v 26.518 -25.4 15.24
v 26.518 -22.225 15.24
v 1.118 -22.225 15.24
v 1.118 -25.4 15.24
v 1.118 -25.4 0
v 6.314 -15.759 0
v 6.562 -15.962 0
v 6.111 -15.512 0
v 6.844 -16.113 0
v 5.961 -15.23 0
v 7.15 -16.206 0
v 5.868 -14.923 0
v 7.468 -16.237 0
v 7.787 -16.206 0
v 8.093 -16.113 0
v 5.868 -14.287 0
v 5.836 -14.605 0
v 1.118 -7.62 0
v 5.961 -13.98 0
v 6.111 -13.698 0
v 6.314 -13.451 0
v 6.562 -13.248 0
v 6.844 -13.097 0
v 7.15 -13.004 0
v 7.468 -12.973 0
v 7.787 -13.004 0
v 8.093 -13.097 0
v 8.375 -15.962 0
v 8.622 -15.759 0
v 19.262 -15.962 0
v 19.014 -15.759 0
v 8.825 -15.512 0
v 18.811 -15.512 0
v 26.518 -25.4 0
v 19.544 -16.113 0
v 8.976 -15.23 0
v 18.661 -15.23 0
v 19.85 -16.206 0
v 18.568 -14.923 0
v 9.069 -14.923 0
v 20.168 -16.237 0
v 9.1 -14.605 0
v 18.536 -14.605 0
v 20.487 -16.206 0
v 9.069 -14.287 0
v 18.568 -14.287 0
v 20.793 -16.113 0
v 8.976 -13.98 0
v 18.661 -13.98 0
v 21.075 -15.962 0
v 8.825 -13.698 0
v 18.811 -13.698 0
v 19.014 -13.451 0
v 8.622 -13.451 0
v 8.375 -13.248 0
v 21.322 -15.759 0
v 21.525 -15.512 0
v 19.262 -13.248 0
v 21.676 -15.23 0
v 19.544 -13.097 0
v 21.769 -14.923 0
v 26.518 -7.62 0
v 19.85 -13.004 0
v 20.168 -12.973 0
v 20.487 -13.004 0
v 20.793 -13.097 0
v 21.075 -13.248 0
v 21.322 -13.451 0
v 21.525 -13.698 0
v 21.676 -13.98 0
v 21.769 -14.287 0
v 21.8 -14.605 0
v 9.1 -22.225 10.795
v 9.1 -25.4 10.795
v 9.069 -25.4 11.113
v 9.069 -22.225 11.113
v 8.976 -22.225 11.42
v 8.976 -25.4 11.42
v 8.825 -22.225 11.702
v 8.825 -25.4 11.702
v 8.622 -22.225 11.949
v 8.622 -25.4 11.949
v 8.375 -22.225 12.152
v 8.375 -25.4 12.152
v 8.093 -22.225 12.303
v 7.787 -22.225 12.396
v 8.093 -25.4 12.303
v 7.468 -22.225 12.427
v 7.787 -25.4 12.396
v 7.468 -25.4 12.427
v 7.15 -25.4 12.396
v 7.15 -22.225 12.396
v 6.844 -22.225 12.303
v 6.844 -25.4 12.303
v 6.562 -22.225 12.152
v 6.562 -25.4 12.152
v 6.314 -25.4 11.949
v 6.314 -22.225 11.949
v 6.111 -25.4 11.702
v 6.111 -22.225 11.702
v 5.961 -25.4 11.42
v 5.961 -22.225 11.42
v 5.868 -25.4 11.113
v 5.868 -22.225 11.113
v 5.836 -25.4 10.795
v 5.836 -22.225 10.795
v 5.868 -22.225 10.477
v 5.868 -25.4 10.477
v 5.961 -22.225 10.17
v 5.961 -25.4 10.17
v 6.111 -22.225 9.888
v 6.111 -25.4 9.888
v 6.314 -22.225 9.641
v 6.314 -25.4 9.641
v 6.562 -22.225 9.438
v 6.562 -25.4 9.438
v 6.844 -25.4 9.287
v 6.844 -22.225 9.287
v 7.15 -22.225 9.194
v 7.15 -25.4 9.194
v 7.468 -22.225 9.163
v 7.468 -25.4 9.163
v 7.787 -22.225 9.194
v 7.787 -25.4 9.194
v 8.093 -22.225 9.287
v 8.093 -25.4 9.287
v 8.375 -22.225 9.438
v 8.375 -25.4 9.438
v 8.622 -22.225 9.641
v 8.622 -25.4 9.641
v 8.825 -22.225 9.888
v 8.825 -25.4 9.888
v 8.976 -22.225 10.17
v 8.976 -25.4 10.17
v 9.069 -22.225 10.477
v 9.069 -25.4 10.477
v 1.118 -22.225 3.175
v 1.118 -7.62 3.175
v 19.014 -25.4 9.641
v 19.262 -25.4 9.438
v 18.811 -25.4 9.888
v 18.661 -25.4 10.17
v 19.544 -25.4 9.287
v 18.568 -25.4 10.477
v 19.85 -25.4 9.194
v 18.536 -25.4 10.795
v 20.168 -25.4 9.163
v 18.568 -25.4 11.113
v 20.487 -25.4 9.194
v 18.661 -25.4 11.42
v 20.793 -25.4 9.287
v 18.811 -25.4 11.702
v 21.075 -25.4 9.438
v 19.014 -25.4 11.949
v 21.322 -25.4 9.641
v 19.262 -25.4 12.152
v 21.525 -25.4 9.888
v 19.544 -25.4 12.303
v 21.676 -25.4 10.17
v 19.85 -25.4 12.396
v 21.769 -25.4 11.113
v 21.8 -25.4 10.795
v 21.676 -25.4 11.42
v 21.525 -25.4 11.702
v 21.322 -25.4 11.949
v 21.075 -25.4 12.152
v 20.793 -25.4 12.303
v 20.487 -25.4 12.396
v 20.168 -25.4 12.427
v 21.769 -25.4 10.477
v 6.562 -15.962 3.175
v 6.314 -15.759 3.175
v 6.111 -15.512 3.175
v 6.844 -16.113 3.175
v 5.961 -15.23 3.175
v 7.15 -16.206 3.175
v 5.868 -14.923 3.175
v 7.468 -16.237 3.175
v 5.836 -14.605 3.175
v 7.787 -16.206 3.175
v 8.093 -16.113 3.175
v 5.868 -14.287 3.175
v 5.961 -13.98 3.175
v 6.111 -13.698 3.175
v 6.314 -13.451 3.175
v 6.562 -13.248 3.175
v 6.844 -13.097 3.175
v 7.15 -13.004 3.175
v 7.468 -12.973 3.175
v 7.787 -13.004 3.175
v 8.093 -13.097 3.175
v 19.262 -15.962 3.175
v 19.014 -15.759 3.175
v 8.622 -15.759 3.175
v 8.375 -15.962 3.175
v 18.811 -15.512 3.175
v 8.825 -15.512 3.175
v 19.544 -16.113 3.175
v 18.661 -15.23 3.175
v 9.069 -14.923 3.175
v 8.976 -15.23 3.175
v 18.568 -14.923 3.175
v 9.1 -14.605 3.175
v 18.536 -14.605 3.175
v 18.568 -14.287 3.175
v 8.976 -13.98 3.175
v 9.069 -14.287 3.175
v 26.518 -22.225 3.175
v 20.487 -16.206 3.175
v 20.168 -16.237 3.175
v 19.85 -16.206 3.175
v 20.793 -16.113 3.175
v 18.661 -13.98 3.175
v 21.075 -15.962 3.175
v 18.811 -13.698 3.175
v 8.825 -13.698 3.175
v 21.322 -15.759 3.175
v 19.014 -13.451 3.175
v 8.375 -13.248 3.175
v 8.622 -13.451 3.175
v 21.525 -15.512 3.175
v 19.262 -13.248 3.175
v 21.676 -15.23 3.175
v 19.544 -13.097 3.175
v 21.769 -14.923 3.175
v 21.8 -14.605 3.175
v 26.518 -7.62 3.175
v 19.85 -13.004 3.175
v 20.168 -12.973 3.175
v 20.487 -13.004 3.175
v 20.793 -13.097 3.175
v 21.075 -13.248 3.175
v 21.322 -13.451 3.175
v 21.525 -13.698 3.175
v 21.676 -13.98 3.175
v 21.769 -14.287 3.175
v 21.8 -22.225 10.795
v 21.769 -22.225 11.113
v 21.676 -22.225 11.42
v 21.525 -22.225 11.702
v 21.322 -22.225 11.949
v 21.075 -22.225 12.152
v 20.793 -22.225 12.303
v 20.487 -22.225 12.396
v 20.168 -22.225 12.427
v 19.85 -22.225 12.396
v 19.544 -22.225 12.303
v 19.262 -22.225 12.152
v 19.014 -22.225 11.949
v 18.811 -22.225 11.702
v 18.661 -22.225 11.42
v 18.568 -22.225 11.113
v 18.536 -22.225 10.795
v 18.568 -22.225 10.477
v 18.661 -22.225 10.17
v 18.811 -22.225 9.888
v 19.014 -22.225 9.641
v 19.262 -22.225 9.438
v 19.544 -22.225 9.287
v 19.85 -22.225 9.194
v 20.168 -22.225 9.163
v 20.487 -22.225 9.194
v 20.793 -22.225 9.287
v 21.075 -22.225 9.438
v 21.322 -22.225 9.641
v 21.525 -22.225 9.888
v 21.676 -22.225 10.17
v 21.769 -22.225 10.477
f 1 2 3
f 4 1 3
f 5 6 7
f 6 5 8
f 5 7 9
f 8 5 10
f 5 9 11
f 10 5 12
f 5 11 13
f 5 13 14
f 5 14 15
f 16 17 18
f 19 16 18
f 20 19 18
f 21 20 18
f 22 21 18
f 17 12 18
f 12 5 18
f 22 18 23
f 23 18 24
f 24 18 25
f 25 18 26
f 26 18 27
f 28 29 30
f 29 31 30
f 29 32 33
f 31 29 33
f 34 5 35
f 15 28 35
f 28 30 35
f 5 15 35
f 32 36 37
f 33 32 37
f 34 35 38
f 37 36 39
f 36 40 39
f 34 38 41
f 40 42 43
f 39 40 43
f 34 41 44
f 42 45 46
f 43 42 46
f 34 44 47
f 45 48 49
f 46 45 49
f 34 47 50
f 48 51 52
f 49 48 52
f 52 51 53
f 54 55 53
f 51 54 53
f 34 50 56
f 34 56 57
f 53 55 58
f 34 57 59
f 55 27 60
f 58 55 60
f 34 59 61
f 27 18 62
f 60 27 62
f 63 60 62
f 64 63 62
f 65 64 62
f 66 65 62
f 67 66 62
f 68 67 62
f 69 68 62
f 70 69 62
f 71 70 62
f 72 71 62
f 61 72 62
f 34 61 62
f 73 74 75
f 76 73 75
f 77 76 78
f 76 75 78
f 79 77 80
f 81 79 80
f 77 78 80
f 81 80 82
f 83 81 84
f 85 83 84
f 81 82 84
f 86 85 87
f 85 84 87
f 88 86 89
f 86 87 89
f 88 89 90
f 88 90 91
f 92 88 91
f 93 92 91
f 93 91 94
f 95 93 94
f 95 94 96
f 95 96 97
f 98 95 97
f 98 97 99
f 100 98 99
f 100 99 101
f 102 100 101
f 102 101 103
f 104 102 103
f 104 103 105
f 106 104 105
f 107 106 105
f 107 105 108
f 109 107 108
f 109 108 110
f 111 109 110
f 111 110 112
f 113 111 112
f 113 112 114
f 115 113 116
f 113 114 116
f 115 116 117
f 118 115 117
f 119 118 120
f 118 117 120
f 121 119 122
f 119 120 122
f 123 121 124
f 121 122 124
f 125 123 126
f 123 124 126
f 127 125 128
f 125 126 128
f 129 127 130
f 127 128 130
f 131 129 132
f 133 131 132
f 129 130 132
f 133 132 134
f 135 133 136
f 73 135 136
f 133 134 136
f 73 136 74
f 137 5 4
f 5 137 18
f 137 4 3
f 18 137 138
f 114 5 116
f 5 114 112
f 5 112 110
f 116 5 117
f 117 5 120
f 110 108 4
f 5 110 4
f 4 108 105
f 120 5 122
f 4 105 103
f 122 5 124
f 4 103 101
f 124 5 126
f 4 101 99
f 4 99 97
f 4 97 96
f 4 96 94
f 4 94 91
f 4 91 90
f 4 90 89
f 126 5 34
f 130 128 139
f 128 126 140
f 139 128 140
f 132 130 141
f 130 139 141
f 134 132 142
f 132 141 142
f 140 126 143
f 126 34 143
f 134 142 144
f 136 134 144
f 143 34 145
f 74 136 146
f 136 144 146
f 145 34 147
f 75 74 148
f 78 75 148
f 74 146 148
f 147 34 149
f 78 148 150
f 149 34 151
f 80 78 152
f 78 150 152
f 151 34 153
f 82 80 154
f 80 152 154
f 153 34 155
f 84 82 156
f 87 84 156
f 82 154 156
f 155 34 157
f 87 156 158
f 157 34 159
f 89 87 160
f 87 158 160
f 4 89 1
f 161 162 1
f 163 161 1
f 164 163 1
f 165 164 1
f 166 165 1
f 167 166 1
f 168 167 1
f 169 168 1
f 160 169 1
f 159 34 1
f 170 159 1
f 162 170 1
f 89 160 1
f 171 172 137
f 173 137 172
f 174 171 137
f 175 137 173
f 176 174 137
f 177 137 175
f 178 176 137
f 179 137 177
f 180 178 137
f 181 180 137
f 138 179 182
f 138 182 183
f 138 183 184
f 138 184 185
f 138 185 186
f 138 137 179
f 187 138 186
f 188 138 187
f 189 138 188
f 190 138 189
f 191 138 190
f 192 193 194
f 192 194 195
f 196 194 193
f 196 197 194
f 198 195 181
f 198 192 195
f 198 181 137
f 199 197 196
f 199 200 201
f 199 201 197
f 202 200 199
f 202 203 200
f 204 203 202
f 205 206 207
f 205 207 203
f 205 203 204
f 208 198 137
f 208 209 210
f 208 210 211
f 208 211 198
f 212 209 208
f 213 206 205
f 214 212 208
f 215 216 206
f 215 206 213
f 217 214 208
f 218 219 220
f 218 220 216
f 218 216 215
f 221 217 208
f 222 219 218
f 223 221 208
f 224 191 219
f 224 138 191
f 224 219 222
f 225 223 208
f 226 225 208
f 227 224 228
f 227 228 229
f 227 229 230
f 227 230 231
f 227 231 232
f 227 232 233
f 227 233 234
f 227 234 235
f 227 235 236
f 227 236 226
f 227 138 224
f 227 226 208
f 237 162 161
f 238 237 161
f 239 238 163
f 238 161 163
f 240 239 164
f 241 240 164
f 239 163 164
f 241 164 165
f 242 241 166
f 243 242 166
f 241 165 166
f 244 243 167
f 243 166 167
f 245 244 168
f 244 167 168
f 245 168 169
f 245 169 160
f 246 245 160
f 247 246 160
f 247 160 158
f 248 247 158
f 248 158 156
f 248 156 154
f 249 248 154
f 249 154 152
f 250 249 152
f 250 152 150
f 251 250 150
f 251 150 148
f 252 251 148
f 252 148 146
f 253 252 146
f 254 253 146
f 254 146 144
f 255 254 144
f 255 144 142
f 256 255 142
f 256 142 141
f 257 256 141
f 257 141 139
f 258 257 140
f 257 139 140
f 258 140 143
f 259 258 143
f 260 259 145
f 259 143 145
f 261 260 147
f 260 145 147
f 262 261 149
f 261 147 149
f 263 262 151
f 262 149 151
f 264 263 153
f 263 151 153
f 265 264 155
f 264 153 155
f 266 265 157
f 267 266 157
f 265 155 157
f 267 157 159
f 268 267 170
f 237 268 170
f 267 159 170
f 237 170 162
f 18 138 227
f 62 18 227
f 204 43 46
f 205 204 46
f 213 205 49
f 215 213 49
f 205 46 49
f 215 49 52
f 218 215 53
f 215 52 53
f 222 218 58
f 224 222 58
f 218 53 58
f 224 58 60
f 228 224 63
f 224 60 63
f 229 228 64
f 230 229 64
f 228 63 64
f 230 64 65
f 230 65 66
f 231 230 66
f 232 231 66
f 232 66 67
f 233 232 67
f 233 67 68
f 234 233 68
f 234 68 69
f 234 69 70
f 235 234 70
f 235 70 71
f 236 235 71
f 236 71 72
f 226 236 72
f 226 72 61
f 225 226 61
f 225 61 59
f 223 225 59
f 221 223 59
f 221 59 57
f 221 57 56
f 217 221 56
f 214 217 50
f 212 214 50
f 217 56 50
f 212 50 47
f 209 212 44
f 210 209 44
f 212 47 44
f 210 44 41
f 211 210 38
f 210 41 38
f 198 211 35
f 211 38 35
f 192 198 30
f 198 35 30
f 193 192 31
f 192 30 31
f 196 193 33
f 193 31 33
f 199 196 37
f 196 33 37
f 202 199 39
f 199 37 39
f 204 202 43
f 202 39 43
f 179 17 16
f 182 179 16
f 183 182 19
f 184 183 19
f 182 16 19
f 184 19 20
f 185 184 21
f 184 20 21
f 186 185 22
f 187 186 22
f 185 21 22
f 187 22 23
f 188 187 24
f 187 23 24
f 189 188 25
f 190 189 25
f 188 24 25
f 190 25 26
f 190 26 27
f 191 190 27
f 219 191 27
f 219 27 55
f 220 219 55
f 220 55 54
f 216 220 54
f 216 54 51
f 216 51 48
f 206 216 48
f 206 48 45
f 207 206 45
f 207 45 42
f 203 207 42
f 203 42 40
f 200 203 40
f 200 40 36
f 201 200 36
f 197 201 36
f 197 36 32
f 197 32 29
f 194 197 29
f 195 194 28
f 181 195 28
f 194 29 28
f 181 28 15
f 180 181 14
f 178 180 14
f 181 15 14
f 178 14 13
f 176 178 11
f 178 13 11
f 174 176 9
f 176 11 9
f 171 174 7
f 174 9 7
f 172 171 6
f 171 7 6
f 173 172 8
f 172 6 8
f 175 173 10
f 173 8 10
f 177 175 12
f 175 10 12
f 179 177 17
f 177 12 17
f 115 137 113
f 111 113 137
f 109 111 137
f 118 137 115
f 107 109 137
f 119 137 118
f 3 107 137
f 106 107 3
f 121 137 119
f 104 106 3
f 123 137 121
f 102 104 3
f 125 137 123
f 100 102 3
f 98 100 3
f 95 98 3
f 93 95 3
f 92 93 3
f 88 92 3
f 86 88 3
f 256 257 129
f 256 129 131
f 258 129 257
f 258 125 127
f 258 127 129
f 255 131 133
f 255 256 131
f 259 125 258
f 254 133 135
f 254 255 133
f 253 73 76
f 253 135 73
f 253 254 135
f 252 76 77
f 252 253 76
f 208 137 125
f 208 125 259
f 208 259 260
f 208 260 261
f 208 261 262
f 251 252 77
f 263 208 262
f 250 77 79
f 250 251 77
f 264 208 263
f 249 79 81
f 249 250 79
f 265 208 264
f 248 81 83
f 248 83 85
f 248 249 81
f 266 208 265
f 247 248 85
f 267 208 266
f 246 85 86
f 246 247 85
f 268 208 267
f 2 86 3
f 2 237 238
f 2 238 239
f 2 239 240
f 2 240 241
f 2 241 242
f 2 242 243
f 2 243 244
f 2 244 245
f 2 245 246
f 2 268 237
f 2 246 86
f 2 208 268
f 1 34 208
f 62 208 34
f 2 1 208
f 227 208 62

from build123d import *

# Parameters (mm, degrees)
F0_W      = 25.4
F0_H      = 3.175
F1_DEPTH  = 25.4
F2_W      = 3.175
F2_H      = 15.24
F3_DEPTH  = 25.4
F5_D      = 3.2639
F5_DEPTH  = 12.7
F5_TIP    = 0.9805744872
F7_D      = 3.2639
F7_DEPTH  = 12.7
F7_TIP    = 0.9805744872
F8_W      = 25.4
F8_H      = 3.175
F9_DEPTH  = 3.176
F11_DEPTH = 3.176


with BuildPart() as f1:
    # F0 (on Front) → F1 (new body)
    with BuildSketch(Plane.XZ):
        with Locations((13.8182396877, 1.5875)):
            Rectangle(F0_W, F0_H)
    extrude(amount=F1_DEPTH)

    # F2 (on face) → F3 (join)
    with BuildSketch(Plane.YZ.offset(26.5182396877)):
        with Locations((-23.8125, 10.795)):
            Rectangle(F2_W, F2_H)
    extrude(amount=-F3_DEPTH)

    # F5
    with Locations(Plane(origin=(0, -22.225, 0), x_dir=(-1, 0, 0), z_dir=(0, 1, 0))):
        with Locations((-20.1682396877, 10.795), (-7.4682396877, 10.795)):
            Hole(F5_D / 2, depth=F5_DEPTH)
            with Locations((0, 0, -(F5_DEPTH + F5_TIP / 2))):  # 118° drill point
                Cone(0, F5_D / 2, F5_TIP, mode=Mode.SUBTRACT)

    # F7
    with Locations(Plane.XY.offset(3.175)):
        with Locations((7.4682396877, -14.605), (20.1682396877, -14.605)):
            Hole(F7_D / 2, depth=F7_DEPTH)
            with Locations((0, 0, -(F7_DEPTH + F7_TIP / 2))):  # 118° drill point
                Cone(0, F7_D / 2, F7_TIP, mode=Mode.SUBTRACT)

    # F8 (on face) → F9 (cut, through all)
    with BuildSketch(Plane(origin=(0, -22.225, 0), x_dir=(-1, 0, 0), z_dir=(0, 1, 0))):
        with Locations((-13.8182396877, 16.8275)):
            Rectangle(F8_W, F8_H)
    extrude(amount=-F9_DEPTH, mode=Mode.SUBTRACT)

    # F10 (on face) → F11 (cut, through all)
    with BuildSketch(Plane.XY.offset(3.175)):
        Polygon((13.8182396877, 0), (1.1182396877, 0), (1.1182396877, -7.62), (26.5182396877, -7.62), (26.5182396877, 0), align=None)
    extrude(amount=-F11_DEPTH, mode=Mode.SUBTRACT)


solid = f1.part
